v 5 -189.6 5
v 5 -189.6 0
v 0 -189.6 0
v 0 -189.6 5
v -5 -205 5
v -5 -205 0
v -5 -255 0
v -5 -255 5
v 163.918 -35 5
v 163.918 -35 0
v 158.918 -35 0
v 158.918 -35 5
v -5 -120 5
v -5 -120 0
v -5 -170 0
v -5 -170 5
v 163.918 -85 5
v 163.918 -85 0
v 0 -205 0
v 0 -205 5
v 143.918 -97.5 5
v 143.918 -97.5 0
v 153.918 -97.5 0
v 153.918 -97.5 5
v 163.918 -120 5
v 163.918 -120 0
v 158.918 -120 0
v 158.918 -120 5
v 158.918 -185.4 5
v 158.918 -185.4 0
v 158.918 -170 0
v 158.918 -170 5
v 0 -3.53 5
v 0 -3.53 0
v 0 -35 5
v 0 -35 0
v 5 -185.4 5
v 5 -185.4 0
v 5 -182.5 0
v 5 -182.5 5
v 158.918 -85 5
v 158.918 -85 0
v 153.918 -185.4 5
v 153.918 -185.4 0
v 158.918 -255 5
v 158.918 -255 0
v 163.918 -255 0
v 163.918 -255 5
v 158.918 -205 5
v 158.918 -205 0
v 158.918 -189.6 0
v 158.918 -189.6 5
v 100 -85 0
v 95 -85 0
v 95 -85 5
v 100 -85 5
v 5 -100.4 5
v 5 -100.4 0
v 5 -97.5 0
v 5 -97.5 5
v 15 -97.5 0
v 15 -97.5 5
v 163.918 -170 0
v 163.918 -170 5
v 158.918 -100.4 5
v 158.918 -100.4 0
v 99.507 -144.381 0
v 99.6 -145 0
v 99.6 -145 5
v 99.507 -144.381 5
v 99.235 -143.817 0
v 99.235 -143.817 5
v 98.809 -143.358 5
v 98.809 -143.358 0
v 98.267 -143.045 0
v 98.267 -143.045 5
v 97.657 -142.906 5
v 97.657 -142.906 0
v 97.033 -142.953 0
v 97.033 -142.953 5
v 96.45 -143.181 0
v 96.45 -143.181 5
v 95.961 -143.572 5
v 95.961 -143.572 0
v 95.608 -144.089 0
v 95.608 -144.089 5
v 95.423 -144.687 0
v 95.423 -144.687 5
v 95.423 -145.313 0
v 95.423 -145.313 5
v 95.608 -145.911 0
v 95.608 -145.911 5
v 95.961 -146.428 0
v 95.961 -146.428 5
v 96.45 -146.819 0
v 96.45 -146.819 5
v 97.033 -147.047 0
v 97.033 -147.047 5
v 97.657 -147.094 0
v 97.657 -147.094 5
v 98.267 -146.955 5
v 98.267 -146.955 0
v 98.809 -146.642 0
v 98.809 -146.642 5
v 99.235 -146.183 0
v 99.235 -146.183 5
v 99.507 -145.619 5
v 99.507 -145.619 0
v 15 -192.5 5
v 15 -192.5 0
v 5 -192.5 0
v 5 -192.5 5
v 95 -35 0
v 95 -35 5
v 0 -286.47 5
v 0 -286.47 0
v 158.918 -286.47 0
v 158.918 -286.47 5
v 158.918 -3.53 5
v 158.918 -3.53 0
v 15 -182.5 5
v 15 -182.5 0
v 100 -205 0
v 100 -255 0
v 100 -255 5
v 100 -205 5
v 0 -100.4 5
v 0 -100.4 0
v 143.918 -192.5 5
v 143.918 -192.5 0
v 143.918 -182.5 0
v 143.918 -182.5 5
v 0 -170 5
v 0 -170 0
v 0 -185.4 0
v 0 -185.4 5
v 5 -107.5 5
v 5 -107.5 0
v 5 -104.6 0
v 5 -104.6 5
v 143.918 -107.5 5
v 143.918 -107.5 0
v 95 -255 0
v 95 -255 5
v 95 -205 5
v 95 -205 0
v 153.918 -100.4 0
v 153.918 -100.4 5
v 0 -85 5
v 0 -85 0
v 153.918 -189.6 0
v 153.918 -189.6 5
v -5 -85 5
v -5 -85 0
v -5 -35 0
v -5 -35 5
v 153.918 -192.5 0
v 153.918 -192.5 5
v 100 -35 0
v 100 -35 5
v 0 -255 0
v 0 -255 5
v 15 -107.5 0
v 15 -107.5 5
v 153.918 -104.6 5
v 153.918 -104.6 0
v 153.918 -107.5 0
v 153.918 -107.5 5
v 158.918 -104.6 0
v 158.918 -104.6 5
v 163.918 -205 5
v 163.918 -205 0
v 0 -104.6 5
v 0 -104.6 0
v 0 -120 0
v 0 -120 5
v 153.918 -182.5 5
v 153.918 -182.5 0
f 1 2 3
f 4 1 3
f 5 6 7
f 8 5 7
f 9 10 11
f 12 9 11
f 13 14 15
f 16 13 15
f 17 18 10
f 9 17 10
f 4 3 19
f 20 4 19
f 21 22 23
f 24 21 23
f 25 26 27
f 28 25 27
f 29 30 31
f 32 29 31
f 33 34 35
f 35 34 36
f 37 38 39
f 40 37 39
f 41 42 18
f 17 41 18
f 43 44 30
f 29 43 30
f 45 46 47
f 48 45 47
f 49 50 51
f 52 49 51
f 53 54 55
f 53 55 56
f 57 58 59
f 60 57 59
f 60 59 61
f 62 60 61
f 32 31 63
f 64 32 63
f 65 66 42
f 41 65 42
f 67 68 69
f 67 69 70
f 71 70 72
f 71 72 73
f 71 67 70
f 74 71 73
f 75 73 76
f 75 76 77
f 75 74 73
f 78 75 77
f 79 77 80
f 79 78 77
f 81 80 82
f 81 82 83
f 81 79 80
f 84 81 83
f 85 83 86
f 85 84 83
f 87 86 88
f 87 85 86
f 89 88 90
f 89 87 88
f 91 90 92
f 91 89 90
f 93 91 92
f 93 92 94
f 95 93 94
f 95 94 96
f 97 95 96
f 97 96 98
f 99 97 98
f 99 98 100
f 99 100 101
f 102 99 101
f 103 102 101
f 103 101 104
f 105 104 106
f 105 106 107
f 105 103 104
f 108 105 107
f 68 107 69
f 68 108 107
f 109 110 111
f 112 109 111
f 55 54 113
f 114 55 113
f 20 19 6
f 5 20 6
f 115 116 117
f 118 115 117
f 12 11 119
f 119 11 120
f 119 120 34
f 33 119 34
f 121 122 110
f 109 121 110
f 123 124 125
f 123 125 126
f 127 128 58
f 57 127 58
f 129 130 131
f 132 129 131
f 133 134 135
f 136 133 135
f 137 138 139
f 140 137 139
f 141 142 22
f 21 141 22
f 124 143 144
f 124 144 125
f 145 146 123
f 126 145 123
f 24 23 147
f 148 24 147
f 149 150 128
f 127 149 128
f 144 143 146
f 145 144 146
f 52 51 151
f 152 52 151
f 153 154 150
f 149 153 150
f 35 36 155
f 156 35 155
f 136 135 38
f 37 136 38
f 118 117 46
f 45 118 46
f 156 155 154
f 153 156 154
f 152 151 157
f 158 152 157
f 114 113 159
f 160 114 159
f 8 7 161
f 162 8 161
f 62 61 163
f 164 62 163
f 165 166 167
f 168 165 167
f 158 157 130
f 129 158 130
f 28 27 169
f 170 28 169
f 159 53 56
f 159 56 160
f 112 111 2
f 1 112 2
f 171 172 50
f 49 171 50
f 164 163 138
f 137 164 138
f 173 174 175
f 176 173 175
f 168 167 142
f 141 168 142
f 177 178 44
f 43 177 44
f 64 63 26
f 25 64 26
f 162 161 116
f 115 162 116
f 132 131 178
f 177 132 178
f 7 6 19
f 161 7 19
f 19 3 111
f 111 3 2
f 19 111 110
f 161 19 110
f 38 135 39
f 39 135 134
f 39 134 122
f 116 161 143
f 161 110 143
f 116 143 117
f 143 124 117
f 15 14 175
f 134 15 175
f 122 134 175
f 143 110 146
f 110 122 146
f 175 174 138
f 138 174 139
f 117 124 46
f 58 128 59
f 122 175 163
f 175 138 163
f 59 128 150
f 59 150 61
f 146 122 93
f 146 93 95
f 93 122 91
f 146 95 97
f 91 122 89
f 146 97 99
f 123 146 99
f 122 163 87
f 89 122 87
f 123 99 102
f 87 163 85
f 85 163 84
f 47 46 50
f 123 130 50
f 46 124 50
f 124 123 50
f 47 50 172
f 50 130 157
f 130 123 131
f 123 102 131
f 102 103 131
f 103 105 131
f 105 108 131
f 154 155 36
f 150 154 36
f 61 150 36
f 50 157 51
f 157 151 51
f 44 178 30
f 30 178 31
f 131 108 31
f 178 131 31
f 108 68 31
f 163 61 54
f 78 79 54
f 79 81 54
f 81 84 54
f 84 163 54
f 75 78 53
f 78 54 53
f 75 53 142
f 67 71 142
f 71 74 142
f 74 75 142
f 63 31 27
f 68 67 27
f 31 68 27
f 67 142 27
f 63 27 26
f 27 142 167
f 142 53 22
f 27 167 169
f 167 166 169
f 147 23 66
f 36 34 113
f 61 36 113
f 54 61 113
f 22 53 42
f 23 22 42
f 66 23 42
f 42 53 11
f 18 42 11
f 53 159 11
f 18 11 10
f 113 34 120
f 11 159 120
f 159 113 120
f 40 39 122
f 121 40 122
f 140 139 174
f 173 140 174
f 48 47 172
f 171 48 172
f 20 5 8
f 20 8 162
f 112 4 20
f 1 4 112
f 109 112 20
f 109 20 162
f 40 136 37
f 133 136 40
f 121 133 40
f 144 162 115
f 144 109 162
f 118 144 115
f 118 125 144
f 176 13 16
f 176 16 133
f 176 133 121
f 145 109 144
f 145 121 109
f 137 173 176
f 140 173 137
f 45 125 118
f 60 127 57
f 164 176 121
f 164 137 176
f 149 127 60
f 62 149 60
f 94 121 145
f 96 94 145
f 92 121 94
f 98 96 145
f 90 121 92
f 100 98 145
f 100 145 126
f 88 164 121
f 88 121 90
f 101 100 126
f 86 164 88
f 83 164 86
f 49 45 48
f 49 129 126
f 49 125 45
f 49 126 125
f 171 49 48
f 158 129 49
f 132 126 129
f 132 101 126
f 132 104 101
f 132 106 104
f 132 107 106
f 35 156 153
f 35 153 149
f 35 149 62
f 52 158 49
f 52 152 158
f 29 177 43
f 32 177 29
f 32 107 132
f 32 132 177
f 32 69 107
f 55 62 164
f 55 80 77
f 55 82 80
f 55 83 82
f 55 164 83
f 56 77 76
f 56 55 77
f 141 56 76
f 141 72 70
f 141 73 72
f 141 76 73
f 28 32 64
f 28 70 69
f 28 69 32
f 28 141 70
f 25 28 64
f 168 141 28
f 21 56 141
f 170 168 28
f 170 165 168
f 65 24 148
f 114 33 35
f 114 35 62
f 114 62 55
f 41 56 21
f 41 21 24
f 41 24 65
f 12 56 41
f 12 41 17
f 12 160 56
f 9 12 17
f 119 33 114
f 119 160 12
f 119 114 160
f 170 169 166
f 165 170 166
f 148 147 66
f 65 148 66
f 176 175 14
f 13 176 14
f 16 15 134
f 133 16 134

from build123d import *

# Parameters (mm, degrees)
ESQUISSE1_R        = 2.1
ESQUISSE1_W        = 5
ESQUISSE1_H        = 50
BOSS_EXTRU_1_DEPTH = 5


with BuildPart() as part:
    # Esquisse1 → Boss.-Extru.1 (new body)
    with BuildSketch(Plane.XY):
        Polygon((0, -3.53), (0, -35), (-5, -35), (-5, -85), (0, -85), (0, -100.4), (5, -100.4), (5, -97.5), (15, -97.5), (15, -107.5), (5, -107.5), (5, -104.6), (0, -104.6), (0, -120), (-5, -120), (-5, -170), (0, -170), (0, -185.4), (5, -185.4), (5, -182.5), (15, -182.5), (15, -192.5), (5, -192.5), (5, -189.6), (0, -189.6), (0, -205), (-5, -205), (-5, -255), (0, -255), (0, -286.47), (158.918484905, -286.47), (158.918484905, -255), (163.918484905, -255), (163.918484905, -205), (158.918484905, -205), (158.918484905, -189.6), (153.918484905, -189.6), (153.918484905, -192.5), (143.918484905, -192.5), (143.918484905, -182.5), (153.918484905, -182.5), (153.918484905, -185.4), (158.918484905, -185.4), (158.918484905, -170), (163.918484905, -170), (163.918484905, -120), (158.918484905, -120), (158.918484905, -104.6), (153.918484905, -104.6), (153.918484905, -107.5), (143.918484905, -107.5), (143.918484905, -97.5), (153.918484905, -97.5), (153.918484905, -100.4), (158.918484905, -100.4), (158.918484905, -85), (163.918484905, -85), (163.918484905, -35), (158.918484905, -35), (158.918484905, -3.53), align=None)
        with Locations((97.5, -145)):
            Circle(ESQUISSE1_R, mode=Mode.SUBTRACT)
        with Locations((97.5, -60)):
            Rectangle(ESQUISSE1_W, ESQUISSE1_H, mode=Mode.SUBTRACT)
        with Locations((97.5, -230)):
            Rectangle(ESQUISSE1_W, ESQUISSE1_H, mode=Mode.SUBTRACT)
    extrude(amount=BOSS_EXTRU_1_DEPTH)


solid = part.part
